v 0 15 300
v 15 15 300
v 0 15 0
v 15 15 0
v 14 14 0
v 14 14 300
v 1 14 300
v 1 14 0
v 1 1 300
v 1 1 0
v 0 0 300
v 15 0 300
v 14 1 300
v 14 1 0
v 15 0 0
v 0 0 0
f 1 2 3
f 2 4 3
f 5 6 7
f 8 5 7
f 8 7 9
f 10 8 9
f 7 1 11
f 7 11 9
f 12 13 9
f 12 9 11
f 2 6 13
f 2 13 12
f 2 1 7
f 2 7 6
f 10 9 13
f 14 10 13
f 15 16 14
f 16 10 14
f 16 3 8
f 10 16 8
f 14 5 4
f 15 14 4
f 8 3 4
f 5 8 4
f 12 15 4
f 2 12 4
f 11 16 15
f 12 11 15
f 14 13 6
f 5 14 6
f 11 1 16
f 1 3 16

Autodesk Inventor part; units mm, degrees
ref_plane "YZ Plane" through (0, 0, 0) normal (1, 0, 0) x (0, 1, 0)
ref_plane "XZ Plane" through (0, 0, 0) normal (0, 1, 0) x (-1, 0, 0)
ref_plane "XY Plane" through (0, 0, 0) normal (0, 0, 1) x (1, 0, 0)
sketch "スケッチ1" plane through (0, 0, 0) normal (0, 0, 1) x (1, 0, 0)
  line L0 (0, 0) -> (15, 0)
  line L1 (15, 0) -> (15, 15)
  line L2 (15, 15) -> (0, 15)
  line L3 (0, 15) -> (0, 0)
  dimension "d0" = 15
  dimension "d1" = 15
extrude "押し出し1" add sketch "スケッチ1" along normal blind 300
sketch "スケッチ2" plane through (0, 0, 300) normal (0, 0, 1) x (1, 0, 0)
  line L0 (1, 1) -> (14, 1)
  line L1 (14, 1) -> (14, 14)
  line L2 (14, 14) -> (1, 14)
  line L3 (1, 14) -> (1, 1)
  point P0 (0, 0)
  dimension "d4" = 13
  dimension "d5" = 13
extrude "押し出し2" cut sketch "スケッチ2" against normal blind 300
equation "\"BendRadius\" = Thickness"
equation "\"BendReliefWidth\" = Thickness"
equation "\"BendReliefDepth\" = 0.5 * Thickness"
equation "\"CornerReliefSize\" = 4 * Thickness"
equation "\"MinimumRemnant\" = 2 * Thickness"
equation "\"TransitionRadius\" = BendRadius"
equation "\"JacobiRadiusSize\" = BendRadius"
equation "\"GapSize\" = Thickness"
equation "\"Thickness\" = 0.5"
properties part number "0nhk4"
